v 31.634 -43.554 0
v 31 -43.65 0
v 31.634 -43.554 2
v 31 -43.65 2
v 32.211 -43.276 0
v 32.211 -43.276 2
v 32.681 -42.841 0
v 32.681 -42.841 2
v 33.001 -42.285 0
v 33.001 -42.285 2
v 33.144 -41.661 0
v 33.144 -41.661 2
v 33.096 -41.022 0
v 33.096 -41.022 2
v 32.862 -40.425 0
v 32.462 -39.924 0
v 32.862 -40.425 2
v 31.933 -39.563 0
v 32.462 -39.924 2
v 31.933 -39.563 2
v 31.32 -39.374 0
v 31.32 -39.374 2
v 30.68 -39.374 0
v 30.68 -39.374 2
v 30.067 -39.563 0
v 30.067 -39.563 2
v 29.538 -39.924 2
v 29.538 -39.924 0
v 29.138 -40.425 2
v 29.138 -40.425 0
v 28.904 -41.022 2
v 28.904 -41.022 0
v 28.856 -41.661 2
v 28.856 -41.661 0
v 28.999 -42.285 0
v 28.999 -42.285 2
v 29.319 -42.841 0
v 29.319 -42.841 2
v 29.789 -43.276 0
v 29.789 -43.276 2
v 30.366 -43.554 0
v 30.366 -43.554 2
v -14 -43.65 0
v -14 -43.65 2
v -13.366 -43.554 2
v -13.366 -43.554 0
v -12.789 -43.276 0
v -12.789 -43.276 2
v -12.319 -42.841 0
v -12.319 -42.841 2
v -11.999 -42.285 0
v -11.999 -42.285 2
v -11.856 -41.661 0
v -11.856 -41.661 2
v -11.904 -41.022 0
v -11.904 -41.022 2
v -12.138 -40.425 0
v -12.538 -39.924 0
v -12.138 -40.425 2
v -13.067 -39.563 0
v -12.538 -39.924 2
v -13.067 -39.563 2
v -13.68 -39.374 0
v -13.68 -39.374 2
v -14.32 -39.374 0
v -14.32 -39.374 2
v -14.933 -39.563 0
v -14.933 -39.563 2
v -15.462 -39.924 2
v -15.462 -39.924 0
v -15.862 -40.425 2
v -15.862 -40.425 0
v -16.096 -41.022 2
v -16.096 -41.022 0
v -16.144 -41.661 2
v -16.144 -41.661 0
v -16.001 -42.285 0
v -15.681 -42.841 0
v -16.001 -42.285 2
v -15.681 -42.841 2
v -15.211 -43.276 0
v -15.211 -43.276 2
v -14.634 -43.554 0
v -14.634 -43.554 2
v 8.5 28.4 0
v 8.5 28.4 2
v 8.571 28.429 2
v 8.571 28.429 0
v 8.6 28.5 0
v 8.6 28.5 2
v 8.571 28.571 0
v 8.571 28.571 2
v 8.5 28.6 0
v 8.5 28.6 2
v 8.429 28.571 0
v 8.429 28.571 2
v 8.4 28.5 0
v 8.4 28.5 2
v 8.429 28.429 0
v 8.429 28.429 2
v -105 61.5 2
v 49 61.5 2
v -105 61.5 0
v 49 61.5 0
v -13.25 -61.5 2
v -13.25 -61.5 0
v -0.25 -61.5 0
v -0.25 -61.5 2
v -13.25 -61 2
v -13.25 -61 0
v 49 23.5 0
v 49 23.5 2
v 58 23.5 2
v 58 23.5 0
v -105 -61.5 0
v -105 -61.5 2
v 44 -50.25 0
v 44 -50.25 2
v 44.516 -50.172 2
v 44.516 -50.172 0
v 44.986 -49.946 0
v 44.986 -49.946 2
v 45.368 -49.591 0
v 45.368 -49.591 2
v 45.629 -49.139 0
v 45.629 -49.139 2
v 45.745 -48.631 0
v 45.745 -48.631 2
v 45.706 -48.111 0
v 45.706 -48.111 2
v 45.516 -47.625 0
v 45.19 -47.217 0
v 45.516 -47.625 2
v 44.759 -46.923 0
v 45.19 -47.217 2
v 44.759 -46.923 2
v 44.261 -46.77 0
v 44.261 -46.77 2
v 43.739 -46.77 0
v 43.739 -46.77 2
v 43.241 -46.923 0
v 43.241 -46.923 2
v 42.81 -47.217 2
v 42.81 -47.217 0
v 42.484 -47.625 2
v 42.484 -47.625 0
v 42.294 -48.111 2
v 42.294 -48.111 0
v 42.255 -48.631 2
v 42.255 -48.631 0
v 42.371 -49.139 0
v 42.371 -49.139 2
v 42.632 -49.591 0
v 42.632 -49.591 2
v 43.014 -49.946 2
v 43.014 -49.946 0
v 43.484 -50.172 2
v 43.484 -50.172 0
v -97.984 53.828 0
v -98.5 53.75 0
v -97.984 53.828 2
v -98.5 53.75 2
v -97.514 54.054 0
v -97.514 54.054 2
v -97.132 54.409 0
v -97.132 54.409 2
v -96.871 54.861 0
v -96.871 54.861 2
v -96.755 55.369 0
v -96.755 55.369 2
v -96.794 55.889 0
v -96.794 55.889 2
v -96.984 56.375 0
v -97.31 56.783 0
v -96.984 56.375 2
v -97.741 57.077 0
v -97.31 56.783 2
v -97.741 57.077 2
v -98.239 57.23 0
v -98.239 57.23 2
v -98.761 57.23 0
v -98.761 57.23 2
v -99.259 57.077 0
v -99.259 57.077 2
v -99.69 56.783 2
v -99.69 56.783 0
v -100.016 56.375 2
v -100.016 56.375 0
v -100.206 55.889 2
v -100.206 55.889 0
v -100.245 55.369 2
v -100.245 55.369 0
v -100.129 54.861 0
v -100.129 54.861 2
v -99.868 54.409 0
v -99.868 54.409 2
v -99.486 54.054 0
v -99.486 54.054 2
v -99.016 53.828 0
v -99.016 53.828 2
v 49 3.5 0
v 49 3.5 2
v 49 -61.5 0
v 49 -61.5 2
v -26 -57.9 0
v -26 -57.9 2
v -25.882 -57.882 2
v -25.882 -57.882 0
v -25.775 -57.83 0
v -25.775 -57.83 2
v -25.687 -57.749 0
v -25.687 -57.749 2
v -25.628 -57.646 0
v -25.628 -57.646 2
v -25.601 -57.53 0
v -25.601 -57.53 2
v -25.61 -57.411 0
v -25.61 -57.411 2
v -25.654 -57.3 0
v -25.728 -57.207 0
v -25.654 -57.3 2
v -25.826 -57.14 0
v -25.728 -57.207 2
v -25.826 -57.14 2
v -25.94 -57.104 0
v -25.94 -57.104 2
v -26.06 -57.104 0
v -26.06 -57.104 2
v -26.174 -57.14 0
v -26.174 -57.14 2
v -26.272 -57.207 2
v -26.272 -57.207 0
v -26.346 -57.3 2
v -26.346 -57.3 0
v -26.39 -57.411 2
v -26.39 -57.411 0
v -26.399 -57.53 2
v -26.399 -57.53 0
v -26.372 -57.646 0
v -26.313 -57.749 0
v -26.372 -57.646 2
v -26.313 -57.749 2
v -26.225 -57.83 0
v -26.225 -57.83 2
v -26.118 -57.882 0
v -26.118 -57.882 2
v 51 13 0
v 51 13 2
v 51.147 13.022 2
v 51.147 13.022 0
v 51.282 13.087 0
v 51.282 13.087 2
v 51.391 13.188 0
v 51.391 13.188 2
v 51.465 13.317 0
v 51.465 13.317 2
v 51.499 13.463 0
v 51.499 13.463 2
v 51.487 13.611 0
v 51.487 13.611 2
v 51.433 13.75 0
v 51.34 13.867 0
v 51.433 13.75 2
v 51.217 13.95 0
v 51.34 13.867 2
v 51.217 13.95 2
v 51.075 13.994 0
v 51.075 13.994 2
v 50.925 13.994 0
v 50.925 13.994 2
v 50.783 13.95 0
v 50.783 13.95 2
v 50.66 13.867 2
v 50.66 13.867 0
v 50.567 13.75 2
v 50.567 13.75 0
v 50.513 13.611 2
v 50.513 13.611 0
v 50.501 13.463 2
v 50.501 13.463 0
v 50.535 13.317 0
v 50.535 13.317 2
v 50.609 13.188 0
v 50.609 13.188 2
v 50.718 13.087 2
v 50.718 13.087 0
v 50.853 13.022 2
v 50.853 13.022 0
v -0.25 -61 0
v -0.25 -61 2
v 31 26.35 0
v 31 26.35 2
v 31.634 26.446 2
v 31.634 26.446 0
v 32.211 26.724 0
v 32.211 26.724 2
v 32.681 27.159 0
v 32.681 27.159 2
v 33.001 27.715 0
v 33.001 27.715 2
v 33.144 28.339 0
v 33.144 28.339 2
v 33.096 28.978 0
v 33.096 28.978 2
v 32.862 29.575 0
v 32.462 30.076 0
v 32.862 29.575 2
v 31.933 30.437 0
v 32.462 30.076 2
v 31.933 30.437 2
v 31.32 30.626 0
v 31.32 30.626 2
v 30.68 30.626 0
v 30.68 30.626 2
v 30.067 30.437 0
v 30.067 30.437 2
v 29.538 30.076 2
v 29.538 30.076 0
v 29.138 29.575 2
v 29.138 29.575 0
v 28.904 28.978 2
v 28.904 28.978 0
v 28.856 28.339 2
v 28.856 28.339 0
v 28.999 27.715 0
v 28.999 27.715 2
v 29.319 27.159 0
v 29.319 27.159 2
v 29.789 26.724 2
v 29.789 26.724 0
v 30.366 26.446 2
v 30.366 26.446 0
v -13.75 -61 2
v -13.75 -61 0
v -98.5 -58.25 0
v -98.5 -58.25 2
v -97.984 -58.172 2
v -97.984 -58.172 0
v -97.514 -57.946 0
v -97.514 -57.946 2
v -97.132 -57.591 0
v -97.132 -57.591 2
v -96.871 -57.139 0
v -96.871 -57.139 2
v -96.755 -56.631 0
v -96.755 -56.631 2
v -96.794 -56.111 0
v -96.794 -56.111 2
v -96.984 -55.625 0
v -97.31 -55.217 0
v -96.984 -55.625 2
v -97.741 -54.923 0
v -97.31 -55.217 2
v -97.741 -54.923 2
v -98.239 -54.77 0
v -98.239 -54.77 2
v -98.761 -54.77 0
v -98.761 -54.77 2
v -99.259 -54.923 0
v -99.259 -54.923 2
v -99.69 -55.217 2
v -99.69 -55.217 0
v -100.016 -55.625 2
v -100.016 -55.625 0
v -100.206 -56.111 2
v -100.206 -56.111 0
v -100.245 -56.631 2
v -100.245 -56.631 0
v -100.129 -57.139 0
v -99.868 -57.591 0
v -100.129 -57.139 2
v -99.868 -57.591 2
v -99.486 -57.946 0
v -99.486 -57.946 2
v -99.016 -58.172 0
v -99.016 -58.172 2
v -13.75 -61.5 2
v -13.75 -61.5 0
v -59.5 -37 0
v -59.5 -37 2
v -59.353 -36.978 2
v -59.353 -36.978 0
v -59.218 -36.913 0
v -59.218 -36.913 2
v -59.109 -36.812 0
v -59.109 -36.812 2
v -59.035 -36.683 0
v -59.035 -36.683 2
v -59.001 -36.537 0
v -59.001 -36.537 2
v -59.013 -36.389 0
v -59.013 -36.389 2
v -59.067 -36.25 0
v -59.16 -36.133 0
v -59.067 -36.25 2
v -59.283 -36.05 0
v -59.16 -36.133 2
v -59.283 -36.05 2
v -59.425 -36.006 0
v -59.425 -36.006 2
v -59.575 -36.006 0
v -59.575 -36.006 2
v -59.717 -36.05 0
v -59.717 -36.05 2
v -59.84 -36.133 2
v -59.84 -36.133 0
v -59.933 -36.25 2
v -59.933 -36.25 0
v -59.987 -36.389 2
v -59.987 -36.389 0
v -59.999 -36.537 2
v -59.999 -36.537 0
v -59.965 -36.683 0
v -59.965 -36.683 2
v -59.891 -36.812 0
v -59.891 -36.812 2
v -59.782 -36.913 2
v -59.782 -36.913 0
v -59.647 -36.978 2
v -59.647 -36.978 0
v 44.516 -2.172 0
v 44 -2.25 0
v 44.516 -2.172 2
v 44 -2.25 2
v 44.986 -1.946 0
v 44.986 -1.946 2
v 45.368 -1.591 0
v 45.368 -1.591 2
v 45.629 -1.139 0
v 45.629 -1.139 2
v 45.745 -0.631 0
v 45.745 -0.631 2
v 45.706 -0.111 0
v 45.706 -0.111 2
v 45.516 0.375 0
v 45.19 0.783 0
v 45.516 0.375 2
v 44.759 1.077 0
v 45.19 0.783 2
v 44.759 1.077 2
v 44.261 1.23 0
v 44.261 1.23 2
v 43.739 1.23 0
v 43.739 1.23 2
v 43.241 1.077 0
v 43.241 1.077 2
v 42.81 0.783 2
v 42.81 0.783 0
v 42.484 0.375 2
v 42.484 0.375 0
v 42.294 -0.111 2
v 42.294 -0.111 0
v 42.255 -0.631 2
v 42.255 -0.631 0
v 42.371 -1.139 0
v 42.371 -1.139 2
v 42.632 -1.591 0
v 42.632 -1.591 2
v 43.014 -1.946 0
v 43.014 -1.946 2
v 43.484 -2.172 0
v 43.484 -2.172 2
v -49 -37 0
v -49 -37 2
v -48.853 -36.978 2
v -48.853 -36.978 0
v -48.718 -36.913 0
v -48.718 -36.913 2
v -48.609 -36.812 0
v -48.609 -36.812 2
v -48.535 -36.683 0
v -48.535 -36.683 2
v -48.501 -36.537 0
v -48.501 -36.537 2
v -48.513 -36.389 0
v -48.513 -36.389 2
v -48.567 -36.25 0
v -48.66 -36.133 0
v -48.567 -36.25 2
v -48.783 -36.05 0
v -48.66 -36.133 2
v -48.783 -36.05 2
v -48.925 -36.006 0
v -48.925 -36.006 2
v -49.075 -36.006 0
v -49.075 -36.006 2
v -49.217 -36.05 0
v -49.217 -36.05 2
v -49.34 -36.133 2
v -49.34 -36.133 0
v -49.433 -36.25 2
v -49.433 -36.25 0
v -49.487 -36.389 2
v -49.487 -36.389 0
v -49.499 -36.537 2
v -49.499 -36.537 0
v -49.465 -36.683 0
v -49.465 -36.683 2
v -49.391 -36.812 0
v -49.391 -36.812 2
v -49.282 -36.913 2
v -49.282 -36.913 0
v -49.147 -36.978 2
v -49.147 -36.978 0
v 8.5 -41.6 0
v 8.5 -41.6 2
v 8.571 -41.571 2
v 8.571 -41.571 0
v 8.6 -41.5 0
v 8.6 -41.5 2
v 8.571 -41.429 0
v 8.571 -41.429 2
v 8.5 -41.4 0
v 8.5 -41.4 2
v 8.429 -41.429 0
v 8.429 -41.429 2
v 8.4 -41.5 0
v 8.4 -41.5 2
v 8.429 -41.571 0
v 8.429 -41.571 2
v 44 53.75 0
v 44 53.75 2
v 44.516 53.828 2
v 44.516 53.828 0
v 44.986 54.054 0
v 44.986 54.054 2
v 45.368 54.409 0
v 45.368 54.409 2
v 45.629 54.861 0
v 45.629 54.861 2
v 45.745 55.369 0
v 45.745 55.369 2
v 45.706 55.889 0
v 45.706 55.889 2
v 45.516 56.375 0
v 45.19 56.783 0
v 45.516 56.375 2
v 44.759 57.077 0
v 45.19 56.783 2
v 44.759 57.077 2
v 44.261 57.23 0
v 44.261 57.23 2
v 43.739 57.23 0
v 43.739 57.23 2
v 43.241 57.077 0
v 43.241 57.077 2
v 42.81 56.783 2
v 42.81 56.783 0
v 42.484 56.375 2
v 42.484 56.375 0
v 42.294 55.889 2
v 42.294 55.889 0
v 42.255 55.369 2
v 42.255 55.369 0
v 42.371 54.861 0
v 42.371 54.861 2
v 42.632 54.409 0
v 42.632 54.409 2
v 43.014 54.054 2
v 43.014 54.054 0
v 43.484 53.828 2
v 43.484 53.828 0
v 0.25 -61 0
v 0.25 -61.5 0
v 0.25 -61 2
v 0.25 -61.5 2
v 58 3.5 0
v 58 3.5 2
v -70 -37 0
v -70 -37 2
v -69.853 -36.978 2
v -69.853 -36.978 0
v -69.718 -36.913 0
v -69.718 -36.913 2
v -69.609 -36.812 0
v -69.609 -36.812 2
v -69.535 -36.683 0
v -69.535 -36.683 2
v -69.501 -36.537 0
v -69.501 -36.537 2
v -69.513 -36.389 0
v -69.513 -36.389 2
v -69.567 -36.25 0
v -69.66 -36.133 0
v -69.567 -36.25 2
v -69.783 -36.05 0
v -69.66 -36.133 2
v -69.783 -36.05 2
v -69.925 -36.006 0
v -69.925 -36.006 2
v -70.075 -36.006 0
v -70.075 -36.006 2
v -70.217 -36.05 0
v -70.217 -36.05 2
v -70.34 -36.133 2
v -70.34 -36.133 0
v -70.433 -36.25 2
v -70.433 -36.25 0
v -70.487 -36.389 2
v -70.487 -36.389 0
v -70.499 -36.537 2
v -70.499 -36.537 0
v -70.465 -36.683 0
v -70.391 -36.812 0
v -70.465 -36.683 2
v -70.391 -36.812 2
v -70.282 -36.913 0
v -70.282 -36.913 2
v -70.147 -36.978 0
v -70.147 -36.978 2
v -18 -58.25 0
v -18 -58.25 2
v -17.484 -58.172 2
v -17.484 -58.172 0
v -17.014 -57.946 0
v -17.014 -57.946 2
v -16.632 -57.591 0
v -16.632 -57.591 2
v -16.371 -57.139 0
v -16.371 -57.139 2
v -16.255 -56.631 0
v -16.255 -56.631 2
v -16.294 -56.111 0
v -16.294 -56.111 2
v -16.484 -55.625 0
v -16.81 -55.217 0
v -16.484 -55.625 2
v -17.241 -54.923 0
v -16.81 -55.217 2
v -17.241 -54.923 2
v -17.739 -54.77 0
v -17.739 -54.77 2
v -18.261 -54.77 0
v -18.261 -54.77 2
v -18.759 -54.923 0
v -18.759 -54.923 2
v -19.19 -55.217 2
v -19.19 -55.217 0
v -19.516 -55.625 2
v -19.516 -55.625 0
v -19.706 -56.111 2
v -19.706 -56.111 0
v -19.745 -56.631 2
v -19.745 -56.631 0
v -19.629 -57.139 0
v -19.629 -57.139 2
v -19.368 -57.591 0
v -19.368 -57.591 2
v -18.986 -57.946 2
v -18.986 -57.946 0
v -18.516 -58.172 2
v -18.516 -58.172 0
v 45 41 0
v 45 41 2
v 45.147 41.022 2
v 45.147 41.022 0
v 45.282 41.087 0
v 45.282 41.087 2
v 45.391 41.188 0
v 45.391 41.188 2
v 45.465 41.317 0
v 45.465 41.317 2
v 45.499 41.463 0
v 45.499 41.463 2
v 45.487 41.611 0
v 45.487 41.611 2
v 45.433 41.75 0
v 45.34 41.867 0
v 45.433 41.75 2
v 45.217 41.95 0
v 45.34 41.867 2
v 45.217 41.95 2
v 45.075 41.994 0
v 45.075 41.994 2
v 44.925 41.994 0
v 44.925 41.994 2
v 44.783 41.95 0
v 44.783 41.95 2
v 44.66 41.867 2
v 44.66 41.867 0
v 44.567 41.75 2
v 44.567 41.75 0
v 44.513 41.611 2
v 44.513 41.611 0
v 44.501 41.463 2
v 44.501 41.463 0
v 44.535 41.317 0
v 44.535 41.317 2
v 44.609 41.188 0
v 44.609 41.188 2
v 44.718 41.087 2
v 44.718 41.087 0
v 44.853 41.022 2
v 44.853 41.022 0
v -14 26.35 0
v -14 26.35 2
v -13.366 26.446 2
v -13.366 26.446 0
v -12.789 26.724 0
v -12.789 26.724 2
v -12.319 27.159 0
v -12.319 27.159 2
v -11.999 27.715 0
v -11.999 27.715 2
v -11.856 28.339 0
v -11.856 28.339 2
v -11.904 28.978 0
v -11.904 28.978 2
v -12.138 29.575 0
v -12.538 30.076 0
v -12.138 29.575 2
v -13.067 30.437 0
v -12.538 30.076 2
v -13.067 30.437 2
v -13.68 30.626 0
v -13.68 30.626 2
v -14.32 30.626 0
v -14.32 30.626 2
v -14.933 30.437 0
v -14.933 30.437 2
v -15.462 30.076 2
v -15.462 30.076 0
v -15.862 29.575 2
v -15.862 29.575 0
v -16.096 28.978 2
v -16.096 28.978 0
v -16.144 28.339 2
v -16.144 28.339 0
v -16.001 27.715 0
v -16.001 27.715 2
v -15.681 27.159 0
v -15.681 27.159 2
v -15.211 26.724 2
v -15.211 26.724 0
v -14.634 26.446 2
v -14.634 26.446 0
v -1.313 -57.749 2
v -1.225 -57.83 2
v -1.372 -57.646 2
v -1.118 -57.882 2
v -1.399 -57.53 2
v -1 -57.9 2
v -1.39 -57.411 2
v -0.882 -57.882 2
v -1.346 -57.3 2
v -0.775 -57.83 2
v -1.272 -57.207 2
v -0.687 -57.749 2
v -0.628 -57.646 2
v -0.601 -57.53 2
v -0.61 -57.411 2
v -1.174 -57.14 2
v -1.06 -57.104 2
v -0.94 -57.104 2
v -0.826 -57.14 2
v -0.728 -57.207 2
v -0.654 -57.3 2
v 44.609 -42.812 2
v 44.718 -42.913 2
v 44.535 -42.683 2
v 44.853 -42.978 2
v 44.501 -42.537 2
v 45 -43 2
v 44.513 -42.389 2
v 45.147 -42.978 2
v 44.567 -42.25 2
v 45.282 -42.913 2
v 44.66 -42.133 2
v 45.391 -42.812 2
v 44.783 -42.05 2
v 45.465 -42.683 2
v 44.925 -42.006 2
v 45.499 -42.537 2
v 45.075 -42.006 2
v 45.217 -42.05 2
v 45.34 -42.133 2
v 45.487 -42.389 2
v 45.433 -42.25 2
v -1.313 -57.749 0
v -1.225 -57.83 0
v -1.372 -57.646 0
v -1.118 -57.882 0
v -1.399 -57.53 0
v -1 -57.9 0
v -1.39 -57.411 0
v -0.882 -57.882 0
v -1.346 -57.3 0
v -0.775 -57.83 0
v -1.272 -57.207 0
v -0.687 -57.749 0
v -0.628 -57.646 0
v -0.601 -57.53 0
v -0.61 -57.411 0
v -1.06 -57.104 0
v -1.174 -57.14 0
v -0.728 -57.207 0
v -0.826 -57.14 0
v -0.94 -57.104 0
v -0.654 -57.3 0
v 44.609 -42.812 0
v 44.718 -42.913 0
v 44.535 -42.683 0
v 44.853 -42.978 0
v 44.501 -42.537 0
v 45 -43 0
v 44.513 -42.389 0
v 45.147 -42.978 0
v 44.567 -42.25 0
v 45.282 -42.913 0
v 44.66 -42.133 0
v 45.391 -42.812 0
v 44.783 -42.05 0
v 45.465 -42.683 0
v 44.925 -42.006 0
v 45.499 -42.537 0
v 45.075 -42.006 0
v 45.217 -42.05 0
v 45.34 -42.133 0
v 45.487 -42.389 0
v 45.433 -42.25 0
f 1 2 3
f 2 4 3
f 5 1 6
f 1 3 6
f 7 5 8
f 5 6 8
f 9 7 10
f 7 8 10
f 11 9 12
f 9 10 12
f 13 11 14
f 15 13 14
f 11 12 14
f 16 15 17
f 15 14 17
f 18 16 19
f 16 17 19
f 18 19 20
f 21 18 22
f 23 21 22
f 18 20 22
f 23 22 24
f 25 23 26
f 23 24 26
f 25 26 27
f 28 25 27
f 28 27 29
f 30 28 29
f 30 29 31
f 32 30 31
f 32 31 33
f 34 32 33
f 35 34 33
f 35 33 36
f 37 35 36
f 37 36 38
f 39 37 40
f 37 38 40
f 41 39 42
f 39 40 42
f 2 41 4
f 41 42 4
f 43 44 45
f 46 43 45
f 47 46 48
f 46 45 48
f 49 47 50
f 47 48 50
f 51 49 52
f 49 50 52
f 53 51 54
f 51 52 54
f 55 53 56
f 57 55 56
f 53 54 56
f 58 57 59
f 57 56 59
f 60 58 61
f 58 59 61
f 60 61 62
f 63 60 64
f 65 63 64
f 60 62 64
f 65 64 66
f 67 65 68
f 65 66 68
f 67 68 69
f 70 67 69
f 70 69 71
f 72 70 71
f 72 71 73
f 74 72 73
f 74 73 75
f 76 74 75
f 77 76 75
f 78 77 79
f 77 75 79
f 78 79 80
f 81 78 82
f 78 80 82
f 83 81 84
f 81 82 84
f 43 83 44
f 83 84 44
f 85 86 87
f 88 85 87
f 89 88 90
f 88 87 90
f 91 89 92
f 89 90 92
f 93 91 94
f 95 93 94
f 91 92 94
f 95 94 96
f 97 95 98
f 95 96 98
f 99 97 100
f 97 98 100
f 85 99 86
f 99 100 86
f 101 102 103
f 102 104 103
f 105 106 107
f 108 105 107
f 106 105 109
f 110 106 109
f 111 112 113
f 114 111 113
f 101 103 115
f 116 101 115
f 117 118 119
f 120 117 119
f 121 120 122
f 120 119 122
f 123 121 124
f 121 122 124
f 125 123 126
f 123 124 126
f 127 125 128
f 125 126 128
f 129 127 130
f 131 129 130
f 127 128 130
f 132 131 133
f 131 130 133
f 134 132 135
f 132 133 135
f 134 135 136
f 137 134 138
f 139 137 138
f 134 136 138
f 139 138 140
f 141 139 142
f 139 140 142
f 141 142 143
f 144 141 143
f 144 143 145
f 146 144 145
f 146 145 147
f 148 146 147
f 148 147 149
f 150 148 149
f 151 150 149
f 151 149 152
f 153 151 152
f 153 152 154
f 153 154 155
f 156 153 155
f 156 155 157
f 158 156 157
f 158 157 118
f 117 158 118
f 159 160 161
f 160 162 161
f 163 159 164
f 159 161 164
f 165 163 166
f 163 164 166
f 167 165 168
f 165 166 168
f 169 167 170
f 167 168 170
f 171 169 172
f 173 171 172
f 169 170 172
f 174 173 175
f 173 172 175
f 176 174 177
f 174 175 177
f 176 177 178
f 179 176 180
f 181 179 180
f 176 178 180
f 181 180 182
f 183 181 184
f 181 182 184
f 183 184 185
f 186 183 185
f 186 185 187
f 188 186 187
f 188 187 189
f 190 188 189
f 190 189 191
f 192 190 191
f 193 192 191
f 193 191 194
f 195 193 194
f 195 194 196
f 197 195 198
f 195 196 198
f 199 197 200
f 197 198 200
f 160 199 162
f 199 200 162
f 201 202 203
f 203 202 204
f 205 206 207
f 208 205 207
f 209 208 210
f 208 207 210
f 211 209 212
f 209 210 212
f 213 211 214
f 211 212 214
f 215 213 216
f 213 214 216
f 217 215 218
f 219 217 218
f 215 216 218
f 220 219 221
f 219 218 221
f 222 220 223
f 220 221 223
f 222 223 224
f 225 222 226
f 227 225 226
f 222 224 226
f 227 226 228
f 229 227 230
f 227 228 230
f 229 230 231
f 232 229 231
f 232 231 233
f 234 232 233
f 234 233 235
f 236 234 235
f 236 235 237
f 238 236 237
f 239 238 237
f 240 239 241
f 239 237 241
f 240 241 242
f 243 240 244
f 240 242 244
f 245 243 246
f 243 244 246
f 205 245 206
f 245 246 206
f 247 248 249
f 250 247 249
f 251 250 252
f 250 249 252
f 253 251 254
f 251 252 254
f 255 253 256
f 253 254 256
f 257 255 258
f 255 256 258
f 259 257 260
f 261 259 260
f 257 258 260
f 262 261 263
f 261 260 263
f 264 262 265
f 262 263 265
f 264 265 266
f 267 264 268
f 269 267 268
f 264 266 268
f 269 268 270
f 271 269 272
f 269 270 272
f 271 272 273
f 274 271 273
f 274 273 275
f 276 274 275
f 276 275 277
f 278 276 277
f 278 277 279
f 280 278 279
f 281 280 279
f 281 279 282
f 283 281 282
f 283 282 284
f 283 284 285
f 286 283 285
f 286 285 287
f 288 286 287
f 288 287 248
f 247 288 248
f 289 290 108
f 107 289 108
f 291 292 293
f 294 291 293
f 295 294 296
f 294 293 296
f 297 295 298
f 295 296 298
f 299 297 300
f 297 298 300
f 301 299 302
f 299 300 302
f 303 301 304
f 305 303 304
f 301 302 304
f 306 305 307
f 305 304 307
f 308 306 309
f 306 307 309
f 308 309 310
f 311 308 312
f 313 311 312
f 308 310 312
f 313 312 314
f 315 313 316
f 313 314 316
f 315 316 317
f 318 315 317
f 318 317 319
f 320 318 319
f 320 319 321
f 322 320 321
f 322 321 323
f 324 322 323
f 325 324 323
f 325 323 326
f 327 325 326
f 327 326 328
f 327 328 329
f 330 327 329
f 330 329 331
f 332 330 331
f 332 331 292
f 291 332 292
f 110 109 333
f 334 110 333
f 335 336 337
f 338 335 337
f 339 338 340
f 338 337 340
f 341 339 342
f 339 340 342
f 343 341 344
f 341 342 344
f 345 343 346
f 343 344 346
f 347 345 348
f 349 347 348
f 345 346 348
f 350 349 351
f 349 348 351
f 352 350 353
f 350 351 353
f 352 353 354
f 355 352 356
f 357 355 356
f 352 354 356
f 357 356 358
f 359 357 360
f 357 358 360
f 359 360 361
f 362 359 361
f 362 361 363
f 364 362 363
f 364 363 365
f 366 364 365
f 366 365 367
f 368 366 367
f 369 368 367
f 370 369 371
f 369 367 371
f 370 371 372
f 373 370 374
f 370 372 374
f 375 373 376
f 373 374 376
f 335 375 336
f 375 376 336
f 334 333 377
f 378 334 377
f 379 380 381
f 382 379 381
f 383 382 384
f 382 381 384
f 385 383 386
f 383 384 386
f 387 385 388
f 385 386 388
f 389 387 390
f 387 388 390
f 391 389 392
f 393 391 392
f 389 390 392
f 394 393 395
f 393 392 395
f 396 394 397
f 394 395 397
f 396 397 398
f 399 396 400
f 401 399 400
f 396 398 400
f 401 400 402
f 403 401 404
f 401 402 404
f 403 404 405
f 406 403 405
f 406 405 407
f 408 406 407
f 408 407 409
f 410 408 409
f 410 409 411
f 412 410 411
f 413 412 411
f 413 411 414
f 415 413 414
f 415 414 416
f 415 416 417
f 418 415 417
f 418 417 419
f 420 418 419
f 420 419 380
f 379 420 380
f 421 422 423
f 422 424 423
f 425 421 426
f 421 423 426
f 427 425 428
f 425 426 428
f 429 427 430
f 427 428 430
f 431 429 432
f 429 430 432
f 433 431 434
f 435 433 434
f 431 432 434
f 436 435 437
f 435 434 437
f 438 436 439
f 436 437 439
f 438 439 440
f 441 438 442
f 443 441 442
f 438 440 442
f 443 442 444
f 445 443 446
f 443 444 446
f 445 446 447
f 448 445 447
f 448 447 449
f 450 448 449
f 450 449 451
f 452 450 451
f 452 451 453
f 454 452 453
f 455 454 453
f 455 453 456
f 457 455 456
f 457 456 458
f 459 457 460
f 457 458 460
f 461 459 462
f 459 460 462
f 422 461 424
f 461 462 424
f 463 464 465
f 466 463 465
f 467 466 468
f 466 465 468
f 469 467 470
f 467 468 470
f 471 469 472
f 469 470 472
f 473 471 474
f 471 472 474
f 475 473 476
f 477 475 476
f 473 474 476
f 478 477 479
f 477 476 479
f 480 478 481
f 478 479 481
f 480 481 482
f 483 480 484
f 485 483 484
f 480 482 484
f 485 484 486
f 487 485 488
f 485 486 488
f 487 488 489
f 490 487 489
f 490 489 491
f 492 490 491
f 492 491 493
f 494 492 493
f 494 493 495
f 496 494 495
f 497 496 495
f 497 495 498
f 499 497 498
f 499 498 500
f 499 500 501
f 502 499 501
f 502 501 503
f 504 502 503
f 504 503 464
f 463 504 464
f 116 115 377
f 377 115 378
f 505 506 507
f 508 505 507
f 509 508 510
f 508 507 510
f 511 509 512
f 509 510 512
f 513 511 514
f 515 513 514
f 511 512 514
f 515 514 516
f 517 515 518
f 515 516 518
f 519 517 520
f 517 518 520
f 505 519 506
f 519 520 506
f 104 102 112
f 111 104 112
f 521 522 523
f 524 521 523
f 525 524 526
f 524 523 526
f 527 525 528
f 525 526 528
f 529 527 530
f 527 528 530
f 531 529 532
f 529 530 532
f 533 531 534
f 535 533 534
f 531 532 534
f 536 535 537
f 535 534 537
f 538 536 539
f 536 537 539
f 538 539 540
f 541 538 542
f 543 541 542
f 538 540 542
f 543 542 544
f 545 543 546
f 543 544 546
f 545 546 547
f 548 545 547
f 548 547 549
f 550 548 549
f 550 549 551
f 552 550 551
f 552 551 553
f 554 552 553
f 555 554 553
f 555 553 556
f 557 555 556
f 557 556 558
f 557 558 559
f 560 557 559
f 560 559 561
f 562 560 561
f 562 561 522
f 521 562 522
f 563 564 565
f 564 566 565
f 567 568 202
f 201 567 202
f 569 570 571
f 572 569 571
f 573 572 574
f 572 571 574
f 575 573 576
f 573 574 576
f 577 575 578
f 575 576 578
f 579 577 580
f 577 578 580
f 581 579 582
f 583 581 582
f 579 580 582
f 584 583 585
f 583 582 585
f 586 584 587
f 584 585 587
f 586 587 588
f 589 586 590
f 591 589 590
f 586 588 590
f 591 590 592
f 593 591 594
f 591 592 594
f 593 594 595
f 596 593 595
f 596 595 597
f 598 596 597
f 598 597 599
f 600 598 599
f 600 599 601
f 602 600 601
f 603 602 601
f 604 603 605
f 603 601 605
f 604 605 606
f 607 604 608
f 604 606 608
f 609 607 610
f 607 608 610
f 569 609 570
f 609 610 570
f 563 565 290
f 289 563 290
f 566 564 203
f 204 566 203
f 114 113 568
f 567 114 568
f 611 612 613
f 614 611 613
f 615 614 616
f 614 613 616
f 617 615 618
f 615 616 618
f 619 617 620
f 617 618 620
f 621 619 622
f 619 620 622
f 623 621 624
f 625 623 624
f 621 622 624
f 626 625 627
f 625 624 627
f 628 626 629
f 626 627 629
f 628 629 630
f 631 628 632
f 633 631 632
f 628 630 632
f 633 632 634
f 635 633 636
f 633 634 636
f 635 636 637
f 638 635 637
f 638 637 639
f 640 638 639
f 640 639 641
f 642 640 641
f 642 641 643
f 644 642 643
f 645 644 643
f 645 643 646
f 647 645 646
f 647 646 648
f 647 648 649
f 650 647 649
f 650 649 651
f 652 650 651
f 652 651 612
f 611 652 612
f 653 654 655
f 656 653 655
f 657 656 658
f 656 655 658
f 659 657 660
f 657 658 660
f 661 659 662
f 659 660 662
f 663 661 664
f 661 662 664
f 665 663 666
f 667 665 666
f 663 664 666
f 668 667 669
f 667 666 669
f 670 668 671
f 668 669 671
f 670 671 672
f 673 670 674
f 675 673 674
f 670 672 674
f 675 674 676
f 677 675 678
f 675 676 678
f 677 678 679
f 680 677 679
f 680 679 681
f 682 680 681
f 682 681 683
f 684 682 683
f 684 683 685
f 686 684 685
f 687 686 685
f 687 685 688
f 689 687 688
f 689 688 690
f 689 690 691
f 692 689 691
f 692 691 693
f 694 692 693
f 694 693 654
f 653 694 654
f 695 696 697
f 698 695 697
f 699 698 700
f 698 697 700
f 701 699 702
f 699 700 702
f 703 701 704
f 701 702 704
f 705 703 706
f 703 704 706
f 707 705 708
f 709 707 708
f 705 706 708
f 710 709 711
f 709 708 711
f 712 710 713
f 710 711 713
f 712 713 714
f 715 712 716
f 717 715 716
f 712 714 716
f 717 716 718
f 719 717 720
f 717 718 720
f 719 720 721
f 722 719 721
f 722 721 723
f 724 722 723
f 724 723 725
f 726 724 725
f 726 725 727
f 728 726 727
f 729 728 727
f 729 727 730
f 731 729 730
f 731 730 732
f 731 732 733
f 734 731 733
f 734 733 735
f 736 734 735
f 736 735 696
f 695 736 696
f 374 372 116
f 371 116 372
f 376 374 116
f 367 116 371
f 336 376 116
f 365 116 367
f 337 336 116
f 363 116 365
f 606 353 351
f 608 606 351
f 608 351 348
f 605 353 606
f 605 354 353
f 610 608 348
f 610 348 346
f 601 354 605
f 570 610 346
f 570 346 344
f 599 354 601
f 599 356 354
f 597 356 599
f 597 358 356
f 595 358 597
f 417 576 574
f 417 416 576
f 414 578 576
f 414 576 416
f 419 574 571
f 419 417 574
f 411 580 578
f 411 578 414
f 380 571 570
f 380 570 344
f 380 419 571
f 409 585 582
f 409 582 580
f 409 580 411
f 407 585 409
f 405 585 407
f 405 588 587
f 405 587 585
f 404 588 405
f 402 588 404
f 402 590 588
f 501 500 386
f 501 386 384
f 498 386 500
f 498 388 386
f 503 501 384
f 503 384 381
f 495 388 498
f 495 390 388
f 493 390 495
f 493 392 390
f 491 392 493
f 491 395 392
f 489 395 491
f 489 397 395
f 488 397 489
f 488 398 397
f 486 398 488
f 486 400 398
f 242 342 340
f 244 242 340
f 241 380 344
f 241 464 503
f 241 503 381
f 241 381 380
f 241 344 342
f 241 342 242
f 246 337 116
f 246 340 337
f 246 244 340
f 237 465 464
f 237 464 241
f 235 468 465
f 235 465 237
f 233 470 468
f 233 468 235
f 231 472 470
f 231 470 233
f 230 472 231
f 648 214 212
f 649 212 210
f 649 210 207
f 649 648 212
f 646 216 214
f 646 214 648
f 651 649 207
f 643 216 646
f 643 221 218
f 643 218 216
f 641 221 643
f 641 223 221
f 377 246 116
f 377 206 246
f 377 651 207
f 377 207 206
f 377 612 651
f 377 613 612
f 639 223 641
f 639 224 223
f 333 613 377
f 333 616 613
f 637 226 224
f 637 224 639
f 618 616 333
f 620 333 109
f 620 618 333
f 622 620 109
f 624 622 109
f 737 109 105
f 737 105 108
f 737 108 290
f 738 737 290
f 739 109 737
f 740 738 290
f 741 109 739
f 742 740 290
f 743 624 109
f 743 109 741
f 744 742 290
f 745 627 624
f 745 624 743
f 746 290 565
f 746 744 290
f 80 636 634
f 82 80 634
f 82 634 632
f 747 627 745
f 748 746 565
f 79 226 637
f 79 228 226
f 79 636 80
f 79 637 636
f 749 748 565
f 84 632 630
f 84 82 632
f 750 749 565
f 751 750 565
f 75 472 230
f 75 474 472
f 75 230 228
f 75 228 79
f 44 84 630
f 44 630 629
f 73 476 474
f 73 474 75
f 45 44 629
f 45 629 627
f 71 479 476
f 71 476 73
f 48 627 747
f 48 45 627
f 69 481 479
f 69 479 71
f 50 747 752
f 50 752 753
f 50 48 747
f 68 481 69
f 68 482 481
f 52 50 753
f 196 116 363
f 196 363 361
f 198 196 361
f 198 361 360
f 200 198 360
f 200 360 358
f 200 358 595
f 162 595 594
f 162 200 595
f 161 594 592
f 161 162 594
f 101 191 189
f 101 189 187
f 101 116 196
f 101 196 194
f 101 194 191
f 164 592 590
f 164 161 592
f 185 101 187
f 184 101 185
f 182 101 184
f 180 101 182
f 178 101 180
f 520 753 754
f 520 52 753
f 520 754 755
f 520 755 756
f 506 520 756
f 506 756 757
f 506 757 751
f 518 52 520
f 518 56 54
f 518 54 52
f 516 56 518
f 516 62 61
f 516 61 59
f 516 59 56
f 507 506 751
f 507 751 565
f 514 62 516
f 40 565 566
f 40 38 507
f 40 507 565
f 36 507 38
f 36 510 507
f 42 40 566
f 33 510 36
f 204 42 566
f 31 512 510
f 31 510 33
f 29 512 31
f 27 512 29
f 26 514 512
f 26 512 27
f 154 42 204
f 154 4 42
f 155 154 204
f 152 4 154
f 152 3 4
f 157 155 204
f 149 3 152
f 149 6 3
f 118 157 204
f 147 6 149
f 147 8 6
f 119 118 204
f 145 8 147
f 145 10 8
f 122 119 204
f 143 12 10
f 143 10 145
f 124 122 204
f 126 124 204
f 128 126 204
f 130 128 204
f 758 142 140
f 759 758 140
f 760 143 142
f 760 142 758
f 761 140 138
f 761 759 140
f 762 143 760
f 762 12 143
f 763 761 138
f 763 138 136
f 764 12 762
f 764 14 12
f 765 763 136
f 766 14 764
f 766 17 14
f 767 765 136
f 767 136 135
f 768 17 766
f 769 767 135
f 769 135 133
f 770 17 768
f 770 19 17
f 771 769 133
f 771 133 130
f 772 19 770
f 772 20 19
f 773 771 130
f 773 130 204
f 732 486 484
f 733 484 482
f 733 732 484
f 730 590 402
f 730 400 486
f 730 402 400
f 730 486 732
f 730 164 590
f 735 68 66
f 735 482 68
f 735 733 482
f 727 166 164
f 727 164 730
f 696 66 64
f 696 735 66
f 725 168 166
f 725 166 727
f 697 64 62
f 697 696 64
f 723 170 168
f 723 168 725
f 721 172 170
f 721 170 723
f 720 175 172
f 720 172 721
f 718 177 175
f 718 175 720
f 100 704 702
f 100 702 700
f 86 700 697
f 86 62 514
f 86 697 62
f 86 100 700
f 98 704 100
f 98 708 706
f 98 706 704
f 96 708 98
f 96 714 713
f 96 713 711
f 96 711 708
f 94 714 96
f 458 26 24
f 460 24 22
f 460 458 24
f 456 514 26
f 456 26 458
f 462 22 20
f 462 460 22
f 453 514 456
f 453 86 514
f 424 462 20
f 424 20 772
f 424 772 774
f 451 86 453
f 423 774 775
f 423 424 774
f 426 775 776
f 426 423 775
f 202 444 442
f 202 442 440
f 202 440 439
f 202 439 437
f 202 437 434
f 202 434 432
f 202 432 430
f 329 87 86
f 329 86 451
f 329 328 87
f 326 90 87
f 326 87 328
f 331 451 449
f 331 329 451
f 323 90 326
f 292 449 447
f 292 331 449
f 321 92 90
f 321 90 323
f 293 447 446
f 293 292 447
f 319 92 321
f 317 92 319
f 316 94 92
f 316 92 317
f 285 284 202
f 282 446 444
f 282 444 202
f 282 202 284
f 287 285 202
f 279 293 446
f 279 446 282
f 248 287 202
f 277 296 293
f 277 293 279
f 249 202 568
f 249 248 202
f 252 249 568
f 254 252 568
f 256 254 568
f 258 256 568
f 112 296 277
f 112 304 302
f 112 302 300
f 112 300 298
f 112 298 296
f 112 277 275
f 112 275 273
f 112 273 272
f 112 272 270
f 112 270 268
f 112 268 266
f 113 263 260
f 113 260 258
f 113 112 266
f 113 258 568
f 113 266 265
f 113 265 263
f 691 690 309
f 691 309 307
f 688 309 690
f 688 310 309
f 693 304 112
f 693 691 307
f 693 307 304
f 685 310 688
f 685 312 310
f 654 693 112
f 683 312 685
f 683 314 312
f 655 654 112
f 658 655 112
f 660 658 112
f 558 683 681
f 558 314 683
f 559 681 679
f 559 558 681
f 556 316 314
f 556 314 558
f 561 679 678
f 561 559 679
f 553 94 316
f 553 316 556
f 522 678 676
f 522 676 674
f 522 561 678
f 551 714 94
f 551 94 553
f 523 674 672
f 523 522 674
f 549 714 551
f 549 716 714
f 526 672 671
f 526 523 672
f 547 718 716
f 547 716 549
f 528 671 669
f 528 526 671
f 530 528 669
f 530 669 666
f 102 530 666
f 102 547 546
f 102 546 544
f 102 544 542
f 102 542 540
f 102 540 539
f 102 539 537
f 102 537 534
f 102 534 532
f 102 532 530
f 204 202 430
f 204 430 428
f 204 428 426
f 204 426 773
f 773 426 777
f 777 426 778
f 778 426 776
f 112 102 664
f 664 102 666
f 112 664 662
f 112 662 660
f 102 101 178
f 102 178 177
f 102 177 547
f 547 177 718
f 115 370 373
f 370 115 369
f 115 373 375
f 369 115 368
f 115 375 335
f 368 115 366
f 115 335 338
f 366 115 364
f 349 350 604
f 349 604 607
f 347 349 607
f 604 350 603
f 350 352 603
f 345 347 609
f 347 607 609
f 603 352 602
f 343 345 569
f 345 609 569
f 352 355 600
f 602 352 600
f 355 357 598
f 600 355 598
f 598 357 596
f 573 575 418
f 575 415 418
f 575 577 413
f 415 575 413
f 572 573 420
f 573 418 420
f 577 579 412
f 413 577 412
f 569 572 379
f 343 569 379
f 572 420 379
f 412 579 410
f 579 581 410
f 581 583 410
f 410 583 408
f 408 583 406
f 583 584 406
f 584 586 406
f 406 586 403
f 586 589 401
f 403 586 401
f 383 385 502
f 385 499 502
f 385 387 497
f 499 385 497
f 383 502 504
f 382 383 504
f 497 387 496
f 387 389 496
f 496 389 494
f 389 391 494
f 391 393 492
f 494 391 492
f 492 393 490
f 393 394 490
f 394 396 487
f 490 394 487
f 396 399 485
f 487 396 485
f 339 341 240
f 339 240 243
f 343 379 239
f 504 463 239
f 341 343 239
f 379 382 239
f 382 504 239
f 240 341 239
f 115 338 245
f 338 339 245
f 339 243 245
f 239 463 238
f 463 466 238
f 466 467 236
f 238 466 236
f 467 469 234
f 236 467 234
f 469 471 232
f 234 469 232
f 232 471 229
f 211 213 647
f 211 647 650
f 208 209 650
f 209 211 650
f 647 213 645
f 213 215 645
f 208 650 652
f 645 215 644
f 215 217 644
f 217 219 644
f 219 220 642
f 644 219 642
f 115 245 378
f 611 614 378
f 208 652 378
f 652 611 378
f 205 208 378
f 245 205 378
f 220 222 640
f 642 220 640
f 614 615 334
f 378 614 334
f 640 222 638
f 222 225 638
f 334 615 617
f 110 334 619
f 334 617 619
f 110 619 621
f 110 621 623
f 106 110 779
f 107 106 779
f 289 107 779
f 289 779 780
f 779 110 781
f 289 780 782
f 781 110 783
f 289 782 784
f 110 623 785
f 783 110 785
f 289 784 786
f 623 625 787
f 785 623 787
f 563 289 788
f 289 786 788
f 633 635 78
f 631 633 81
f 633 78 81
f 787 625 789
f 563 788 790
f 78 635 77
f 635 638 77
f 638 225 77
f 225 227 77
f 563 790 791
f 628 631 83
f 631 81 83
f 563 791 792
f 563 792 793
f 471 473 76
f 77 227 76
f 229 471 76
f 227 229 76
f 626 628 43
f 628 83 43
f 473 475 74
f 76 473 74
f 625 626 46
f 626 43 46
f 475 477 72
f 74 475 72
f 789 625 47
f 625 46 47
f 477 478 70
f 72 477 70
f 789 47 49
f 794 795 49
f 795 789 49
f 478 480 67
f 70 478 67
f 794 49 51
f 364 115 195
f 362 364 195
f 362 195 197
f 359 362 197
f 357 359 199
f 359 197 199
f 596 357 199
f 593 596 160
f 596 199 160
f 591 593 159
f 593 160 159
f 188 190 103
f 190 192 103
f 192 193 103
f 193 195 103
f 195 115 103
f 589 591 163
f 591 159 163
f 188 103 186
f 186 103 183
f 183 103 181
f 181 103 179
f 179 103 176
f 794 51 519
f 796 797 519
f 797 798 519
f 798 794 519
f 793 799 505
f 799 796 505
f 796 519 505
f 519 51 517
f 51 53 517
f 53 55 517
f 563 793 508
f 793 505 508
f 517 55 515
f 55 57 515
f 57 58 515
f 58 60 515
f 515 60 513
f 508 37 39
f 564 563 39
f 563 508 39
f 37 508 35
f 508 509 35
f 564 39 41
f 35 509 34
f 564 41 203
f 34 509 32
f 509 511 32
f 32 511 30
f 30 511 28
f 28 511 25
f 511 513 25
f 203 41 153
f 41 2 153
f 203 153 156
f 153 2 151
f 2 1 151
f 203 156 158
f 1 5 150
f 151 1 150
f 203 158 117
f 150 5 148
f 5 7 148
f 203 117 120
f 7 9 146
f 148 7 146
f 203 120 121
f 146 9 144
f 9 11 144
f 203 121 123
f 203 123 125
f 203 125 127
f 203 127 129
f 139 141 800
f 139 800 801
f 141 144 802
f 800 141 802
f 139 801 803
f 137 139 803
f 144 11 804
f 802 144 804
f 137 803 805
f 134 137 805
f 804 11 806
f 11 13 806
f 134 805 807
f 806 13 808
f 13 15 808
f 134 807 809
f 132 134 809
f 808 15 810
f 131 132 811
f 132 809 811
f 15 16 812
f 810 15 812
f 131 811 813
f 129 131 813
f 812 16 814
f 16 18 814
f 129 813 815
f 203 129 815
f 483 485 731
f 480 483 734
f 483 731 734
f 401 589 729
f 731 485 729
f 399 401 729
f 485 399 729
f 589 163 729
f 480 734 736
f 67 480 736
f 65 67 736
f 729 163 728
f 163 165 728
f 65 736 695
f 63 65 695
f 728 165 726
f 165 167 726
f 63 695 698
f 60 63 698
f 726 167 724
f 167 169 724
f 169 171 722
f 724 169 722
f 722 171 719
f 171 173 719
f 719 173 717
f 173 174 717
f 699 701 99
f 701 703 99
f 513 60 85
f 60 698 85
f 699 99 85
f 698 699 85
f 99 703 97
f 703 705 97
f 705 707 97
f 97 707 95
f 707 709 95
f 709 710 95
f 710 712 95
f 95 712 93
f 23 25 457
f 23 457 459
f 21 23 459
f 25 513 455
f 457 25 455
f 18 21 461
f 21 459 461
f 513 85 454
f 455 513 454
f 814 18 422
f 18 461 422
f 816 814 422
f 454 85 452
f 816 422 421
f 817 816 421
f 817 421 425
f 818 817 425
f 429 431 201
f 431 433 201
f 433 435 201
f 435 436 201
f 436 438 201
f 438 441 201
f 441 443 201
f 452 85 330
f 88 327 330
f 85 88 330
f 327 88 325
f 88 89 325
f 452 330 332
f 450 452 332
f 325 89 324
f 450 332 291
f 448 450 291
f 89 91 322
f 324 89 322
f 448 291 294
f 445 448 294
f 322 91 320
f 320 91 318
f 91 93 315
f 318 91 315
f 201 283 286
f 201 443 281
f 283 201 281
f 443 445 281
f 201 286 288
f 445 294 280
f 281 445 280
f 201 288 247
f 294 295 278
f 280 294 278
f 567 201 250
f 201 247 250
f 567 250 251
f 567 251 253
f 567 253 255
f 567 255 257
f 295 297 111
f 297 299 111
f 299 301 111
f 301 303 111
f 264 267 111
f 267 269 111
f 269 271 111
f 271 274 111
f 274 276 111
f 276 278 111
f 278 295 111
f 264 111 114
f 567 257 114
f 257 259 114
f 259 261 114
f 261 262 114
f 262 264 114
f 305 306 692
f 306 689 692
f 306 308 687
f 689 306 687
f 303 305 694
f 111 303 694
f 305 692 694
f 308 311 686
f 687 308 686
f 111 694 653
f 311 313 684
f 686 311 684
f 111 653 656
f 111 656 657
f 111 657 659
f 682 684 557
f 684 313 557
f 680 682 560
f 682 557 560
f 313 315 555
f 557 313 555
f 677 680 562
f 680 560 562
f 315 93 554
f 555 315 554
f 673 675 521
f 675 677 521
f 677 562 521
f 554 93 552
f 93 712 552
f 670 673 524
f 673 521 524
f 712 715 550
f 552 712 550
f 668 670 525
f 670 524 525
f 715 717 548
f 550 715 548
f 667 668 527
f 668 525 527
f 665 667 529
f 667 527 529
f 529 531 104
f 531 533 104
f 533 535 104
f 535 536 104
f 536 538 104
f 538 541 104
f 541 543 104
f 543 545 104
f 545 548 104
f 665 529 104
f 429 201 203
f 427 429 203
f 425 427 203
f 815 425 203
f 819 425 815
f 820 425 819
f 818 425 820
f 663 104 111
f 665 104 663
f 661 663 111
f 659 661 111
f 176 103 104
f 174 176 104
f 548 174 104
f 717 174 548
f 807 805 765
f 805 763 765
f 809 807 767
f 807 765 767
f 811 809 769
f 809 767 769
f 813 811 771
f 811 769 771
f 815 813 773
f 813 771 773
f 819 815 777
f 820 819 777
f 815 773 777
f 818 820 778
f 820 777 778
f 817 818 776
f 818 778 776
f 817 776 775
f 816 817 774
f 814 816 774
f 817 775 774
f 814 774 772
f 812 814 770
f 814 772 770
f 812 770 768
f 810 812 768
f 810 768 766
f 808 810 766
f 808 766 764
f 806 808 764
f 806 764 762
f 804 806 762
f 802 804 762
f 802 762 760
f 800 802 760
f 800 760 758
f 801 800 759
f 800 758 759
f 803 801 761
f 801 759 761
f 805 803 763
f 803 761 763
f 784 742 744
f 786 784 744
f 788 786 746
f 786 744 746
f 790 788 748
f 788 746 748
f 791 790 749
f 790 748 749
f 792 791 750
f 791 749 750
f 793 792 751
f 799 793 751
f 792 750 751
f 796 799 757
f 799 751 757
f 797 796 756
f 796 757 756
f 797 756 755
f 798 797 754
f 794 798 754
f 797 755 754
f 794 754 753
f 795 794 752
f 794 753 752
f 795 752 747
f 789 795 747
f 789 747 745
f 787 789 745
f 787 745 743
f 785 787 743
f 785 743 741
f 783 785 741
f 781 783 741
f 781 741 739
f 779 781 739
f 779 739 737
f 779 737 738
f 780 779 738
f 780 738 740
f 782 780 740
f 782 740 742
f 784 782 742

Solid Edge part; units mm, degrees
sketch "Sketch1" plane through (0, 0, 0) normal (0, 0, 1) x (1, 0, 0)
  line L0 (-105, -61.5) -> (105, -61.5)
  line L1 (105, -61.5) -> (105, 61.5)
  line L2 (105, 61.5) -> (-105, 61.5)
  line L3 (-105, 61.5) -> (-105, -61.5)
  dimension "D1" = 123
  dimension "D2" = 210
extrude "Protrusion1" add sketch "Sketch1" along normal blind 2
hole "Hole1" at (-1, -57.5, 2) direction (0, 0, -1) diameter 0.8 end through all
hole "Hole2" at (-26, -57.5, 2) direction (0, 0, -1) diameter 0.8 end through all
sketch "Sketch2" plane through (0, 0, 2) normal (0, 0, 1) x (-1, 0, 0)
  line L0 (-0.25, 61) -> (0.25, 61)
  line L1 (0.25, 61) -> (0.25, 61.5)
  line L2 (0.25, 61.5) -> (-0.25, 61.5)
  line L3 (-0.25, 61.5) -> (-0.25, 61)
  dimension "D1" = 0.5
extrude "Cutout1" cut sketch "Sketch2" against normal through all
sketch "Sketch3" plane through (0, 0, 2) normal (0, 0, 1) x (1, 0, 0)
  line L0 (105, -61.5) -> (105, 61.5)
  line L1 (49, -61.5) -> (105, -61.5)
  line L2 (49, 3.5) -> (49, -61.5)
  line L3 (58, 3.5) -> (49, 3.5)
  line L4 (58, 23.5) -> (58, 3.5)
  line L5 (49, 23.5) -> (58, 23.5)
  line L6 (49, 61.5) -> (49, 23.5)
  line L7 (105, 61.5) -> (49, 61.5)
  dimension "D1" = 154
  dimension "D2" = 20
  dimension "D3" = 38
  dimension "D4" = 9
extrude "Ausschnitt_3" cut sketch "Sketch3" against normal blind 2
hole "Hole3" at (-98.5, 55.5, 2) direction (0, 0, -1) diameter 3.5 end through all
hole "Hole4" at (44, 55.5, 2) direction (0, 0, -1) diameter 3.5 end through all
hole "Hole5" at (44, -48.5, 2) direction (0, 0, -1) diameter 3.5 end through all
hole "Hole6" at (-18, -56.5, 2) direction (0, 0, -1) diameter 3.5 end through all
hole "Hole7" at (-98.5, -56.5, 2) direction (0, 0, -1) diameter 3.5 end through all
hole "Hole8" at (44, -0.5, 2) direction (0, 0, -1) diameter 3.5 end through all
hole "Hole9" at (45, -42.5, 2) direction (0, 0, -1) diameter 1 end through all
hole "Hole10" at (45, 41.5, 2) direction (0, 0, -1) diameter 1 end through all
hole "Hole11" at (51, 13.5, 2) direction (0, 0, -1) diameter 1 end through all
hole "Hole12" at (-59.5, -36.5, 2) direction (0, 0, -1) diameter 1 end through all
hole "Hole13" at (-49, -36.5, 2) direction (0, 0, -1) diameter 1 end through all
hole "Hole14" at (-70, -36.5, 2) direction (0, 0, -1) diameter 1 end through all
hole "Hole15" at (31, 28.5, 2) direction (0, 0, -1) diameter 4.3 end up to next
hole "Hole16" at (31, -41.5, 2) direction (0, 0, -1) diameter 4.3 end up to next
hole "Hole17" at (-14, -41.5, 2) direction (0, 0, -1) diameter 4.3 end up to next
hole "Hole18" at (-14, 28.5, 2) direction (0, 0, -1) diameter 4.3 end up to next
hole "Hole19" at (8.5, -41.5, 2) direction (0, 0, -1) diameter 0.2 end through all
hole "Hole20" at (8.5, 28.5, 2) direction (0, 0, -1) diameter 0.2 end through all
sketch "Sketch4" plane through (-23.4888, 0, 2) normal (0, 0, 1) x (1, 0, 0)
  line L0 (9.7388, -61.5) -> (10.2388, -61.5)
  line L1 (10.2388, -61.5) -> (10.2388, -61)
  line L2 (10.2388, -61) -> (9.7388, -61)
  line L3 (9.7388, -61) -> (9.7388, -61.5)
  dimension "D1" = 0.5
extrude "Cutout2" cut sketch "Sketch4" against normal through all
